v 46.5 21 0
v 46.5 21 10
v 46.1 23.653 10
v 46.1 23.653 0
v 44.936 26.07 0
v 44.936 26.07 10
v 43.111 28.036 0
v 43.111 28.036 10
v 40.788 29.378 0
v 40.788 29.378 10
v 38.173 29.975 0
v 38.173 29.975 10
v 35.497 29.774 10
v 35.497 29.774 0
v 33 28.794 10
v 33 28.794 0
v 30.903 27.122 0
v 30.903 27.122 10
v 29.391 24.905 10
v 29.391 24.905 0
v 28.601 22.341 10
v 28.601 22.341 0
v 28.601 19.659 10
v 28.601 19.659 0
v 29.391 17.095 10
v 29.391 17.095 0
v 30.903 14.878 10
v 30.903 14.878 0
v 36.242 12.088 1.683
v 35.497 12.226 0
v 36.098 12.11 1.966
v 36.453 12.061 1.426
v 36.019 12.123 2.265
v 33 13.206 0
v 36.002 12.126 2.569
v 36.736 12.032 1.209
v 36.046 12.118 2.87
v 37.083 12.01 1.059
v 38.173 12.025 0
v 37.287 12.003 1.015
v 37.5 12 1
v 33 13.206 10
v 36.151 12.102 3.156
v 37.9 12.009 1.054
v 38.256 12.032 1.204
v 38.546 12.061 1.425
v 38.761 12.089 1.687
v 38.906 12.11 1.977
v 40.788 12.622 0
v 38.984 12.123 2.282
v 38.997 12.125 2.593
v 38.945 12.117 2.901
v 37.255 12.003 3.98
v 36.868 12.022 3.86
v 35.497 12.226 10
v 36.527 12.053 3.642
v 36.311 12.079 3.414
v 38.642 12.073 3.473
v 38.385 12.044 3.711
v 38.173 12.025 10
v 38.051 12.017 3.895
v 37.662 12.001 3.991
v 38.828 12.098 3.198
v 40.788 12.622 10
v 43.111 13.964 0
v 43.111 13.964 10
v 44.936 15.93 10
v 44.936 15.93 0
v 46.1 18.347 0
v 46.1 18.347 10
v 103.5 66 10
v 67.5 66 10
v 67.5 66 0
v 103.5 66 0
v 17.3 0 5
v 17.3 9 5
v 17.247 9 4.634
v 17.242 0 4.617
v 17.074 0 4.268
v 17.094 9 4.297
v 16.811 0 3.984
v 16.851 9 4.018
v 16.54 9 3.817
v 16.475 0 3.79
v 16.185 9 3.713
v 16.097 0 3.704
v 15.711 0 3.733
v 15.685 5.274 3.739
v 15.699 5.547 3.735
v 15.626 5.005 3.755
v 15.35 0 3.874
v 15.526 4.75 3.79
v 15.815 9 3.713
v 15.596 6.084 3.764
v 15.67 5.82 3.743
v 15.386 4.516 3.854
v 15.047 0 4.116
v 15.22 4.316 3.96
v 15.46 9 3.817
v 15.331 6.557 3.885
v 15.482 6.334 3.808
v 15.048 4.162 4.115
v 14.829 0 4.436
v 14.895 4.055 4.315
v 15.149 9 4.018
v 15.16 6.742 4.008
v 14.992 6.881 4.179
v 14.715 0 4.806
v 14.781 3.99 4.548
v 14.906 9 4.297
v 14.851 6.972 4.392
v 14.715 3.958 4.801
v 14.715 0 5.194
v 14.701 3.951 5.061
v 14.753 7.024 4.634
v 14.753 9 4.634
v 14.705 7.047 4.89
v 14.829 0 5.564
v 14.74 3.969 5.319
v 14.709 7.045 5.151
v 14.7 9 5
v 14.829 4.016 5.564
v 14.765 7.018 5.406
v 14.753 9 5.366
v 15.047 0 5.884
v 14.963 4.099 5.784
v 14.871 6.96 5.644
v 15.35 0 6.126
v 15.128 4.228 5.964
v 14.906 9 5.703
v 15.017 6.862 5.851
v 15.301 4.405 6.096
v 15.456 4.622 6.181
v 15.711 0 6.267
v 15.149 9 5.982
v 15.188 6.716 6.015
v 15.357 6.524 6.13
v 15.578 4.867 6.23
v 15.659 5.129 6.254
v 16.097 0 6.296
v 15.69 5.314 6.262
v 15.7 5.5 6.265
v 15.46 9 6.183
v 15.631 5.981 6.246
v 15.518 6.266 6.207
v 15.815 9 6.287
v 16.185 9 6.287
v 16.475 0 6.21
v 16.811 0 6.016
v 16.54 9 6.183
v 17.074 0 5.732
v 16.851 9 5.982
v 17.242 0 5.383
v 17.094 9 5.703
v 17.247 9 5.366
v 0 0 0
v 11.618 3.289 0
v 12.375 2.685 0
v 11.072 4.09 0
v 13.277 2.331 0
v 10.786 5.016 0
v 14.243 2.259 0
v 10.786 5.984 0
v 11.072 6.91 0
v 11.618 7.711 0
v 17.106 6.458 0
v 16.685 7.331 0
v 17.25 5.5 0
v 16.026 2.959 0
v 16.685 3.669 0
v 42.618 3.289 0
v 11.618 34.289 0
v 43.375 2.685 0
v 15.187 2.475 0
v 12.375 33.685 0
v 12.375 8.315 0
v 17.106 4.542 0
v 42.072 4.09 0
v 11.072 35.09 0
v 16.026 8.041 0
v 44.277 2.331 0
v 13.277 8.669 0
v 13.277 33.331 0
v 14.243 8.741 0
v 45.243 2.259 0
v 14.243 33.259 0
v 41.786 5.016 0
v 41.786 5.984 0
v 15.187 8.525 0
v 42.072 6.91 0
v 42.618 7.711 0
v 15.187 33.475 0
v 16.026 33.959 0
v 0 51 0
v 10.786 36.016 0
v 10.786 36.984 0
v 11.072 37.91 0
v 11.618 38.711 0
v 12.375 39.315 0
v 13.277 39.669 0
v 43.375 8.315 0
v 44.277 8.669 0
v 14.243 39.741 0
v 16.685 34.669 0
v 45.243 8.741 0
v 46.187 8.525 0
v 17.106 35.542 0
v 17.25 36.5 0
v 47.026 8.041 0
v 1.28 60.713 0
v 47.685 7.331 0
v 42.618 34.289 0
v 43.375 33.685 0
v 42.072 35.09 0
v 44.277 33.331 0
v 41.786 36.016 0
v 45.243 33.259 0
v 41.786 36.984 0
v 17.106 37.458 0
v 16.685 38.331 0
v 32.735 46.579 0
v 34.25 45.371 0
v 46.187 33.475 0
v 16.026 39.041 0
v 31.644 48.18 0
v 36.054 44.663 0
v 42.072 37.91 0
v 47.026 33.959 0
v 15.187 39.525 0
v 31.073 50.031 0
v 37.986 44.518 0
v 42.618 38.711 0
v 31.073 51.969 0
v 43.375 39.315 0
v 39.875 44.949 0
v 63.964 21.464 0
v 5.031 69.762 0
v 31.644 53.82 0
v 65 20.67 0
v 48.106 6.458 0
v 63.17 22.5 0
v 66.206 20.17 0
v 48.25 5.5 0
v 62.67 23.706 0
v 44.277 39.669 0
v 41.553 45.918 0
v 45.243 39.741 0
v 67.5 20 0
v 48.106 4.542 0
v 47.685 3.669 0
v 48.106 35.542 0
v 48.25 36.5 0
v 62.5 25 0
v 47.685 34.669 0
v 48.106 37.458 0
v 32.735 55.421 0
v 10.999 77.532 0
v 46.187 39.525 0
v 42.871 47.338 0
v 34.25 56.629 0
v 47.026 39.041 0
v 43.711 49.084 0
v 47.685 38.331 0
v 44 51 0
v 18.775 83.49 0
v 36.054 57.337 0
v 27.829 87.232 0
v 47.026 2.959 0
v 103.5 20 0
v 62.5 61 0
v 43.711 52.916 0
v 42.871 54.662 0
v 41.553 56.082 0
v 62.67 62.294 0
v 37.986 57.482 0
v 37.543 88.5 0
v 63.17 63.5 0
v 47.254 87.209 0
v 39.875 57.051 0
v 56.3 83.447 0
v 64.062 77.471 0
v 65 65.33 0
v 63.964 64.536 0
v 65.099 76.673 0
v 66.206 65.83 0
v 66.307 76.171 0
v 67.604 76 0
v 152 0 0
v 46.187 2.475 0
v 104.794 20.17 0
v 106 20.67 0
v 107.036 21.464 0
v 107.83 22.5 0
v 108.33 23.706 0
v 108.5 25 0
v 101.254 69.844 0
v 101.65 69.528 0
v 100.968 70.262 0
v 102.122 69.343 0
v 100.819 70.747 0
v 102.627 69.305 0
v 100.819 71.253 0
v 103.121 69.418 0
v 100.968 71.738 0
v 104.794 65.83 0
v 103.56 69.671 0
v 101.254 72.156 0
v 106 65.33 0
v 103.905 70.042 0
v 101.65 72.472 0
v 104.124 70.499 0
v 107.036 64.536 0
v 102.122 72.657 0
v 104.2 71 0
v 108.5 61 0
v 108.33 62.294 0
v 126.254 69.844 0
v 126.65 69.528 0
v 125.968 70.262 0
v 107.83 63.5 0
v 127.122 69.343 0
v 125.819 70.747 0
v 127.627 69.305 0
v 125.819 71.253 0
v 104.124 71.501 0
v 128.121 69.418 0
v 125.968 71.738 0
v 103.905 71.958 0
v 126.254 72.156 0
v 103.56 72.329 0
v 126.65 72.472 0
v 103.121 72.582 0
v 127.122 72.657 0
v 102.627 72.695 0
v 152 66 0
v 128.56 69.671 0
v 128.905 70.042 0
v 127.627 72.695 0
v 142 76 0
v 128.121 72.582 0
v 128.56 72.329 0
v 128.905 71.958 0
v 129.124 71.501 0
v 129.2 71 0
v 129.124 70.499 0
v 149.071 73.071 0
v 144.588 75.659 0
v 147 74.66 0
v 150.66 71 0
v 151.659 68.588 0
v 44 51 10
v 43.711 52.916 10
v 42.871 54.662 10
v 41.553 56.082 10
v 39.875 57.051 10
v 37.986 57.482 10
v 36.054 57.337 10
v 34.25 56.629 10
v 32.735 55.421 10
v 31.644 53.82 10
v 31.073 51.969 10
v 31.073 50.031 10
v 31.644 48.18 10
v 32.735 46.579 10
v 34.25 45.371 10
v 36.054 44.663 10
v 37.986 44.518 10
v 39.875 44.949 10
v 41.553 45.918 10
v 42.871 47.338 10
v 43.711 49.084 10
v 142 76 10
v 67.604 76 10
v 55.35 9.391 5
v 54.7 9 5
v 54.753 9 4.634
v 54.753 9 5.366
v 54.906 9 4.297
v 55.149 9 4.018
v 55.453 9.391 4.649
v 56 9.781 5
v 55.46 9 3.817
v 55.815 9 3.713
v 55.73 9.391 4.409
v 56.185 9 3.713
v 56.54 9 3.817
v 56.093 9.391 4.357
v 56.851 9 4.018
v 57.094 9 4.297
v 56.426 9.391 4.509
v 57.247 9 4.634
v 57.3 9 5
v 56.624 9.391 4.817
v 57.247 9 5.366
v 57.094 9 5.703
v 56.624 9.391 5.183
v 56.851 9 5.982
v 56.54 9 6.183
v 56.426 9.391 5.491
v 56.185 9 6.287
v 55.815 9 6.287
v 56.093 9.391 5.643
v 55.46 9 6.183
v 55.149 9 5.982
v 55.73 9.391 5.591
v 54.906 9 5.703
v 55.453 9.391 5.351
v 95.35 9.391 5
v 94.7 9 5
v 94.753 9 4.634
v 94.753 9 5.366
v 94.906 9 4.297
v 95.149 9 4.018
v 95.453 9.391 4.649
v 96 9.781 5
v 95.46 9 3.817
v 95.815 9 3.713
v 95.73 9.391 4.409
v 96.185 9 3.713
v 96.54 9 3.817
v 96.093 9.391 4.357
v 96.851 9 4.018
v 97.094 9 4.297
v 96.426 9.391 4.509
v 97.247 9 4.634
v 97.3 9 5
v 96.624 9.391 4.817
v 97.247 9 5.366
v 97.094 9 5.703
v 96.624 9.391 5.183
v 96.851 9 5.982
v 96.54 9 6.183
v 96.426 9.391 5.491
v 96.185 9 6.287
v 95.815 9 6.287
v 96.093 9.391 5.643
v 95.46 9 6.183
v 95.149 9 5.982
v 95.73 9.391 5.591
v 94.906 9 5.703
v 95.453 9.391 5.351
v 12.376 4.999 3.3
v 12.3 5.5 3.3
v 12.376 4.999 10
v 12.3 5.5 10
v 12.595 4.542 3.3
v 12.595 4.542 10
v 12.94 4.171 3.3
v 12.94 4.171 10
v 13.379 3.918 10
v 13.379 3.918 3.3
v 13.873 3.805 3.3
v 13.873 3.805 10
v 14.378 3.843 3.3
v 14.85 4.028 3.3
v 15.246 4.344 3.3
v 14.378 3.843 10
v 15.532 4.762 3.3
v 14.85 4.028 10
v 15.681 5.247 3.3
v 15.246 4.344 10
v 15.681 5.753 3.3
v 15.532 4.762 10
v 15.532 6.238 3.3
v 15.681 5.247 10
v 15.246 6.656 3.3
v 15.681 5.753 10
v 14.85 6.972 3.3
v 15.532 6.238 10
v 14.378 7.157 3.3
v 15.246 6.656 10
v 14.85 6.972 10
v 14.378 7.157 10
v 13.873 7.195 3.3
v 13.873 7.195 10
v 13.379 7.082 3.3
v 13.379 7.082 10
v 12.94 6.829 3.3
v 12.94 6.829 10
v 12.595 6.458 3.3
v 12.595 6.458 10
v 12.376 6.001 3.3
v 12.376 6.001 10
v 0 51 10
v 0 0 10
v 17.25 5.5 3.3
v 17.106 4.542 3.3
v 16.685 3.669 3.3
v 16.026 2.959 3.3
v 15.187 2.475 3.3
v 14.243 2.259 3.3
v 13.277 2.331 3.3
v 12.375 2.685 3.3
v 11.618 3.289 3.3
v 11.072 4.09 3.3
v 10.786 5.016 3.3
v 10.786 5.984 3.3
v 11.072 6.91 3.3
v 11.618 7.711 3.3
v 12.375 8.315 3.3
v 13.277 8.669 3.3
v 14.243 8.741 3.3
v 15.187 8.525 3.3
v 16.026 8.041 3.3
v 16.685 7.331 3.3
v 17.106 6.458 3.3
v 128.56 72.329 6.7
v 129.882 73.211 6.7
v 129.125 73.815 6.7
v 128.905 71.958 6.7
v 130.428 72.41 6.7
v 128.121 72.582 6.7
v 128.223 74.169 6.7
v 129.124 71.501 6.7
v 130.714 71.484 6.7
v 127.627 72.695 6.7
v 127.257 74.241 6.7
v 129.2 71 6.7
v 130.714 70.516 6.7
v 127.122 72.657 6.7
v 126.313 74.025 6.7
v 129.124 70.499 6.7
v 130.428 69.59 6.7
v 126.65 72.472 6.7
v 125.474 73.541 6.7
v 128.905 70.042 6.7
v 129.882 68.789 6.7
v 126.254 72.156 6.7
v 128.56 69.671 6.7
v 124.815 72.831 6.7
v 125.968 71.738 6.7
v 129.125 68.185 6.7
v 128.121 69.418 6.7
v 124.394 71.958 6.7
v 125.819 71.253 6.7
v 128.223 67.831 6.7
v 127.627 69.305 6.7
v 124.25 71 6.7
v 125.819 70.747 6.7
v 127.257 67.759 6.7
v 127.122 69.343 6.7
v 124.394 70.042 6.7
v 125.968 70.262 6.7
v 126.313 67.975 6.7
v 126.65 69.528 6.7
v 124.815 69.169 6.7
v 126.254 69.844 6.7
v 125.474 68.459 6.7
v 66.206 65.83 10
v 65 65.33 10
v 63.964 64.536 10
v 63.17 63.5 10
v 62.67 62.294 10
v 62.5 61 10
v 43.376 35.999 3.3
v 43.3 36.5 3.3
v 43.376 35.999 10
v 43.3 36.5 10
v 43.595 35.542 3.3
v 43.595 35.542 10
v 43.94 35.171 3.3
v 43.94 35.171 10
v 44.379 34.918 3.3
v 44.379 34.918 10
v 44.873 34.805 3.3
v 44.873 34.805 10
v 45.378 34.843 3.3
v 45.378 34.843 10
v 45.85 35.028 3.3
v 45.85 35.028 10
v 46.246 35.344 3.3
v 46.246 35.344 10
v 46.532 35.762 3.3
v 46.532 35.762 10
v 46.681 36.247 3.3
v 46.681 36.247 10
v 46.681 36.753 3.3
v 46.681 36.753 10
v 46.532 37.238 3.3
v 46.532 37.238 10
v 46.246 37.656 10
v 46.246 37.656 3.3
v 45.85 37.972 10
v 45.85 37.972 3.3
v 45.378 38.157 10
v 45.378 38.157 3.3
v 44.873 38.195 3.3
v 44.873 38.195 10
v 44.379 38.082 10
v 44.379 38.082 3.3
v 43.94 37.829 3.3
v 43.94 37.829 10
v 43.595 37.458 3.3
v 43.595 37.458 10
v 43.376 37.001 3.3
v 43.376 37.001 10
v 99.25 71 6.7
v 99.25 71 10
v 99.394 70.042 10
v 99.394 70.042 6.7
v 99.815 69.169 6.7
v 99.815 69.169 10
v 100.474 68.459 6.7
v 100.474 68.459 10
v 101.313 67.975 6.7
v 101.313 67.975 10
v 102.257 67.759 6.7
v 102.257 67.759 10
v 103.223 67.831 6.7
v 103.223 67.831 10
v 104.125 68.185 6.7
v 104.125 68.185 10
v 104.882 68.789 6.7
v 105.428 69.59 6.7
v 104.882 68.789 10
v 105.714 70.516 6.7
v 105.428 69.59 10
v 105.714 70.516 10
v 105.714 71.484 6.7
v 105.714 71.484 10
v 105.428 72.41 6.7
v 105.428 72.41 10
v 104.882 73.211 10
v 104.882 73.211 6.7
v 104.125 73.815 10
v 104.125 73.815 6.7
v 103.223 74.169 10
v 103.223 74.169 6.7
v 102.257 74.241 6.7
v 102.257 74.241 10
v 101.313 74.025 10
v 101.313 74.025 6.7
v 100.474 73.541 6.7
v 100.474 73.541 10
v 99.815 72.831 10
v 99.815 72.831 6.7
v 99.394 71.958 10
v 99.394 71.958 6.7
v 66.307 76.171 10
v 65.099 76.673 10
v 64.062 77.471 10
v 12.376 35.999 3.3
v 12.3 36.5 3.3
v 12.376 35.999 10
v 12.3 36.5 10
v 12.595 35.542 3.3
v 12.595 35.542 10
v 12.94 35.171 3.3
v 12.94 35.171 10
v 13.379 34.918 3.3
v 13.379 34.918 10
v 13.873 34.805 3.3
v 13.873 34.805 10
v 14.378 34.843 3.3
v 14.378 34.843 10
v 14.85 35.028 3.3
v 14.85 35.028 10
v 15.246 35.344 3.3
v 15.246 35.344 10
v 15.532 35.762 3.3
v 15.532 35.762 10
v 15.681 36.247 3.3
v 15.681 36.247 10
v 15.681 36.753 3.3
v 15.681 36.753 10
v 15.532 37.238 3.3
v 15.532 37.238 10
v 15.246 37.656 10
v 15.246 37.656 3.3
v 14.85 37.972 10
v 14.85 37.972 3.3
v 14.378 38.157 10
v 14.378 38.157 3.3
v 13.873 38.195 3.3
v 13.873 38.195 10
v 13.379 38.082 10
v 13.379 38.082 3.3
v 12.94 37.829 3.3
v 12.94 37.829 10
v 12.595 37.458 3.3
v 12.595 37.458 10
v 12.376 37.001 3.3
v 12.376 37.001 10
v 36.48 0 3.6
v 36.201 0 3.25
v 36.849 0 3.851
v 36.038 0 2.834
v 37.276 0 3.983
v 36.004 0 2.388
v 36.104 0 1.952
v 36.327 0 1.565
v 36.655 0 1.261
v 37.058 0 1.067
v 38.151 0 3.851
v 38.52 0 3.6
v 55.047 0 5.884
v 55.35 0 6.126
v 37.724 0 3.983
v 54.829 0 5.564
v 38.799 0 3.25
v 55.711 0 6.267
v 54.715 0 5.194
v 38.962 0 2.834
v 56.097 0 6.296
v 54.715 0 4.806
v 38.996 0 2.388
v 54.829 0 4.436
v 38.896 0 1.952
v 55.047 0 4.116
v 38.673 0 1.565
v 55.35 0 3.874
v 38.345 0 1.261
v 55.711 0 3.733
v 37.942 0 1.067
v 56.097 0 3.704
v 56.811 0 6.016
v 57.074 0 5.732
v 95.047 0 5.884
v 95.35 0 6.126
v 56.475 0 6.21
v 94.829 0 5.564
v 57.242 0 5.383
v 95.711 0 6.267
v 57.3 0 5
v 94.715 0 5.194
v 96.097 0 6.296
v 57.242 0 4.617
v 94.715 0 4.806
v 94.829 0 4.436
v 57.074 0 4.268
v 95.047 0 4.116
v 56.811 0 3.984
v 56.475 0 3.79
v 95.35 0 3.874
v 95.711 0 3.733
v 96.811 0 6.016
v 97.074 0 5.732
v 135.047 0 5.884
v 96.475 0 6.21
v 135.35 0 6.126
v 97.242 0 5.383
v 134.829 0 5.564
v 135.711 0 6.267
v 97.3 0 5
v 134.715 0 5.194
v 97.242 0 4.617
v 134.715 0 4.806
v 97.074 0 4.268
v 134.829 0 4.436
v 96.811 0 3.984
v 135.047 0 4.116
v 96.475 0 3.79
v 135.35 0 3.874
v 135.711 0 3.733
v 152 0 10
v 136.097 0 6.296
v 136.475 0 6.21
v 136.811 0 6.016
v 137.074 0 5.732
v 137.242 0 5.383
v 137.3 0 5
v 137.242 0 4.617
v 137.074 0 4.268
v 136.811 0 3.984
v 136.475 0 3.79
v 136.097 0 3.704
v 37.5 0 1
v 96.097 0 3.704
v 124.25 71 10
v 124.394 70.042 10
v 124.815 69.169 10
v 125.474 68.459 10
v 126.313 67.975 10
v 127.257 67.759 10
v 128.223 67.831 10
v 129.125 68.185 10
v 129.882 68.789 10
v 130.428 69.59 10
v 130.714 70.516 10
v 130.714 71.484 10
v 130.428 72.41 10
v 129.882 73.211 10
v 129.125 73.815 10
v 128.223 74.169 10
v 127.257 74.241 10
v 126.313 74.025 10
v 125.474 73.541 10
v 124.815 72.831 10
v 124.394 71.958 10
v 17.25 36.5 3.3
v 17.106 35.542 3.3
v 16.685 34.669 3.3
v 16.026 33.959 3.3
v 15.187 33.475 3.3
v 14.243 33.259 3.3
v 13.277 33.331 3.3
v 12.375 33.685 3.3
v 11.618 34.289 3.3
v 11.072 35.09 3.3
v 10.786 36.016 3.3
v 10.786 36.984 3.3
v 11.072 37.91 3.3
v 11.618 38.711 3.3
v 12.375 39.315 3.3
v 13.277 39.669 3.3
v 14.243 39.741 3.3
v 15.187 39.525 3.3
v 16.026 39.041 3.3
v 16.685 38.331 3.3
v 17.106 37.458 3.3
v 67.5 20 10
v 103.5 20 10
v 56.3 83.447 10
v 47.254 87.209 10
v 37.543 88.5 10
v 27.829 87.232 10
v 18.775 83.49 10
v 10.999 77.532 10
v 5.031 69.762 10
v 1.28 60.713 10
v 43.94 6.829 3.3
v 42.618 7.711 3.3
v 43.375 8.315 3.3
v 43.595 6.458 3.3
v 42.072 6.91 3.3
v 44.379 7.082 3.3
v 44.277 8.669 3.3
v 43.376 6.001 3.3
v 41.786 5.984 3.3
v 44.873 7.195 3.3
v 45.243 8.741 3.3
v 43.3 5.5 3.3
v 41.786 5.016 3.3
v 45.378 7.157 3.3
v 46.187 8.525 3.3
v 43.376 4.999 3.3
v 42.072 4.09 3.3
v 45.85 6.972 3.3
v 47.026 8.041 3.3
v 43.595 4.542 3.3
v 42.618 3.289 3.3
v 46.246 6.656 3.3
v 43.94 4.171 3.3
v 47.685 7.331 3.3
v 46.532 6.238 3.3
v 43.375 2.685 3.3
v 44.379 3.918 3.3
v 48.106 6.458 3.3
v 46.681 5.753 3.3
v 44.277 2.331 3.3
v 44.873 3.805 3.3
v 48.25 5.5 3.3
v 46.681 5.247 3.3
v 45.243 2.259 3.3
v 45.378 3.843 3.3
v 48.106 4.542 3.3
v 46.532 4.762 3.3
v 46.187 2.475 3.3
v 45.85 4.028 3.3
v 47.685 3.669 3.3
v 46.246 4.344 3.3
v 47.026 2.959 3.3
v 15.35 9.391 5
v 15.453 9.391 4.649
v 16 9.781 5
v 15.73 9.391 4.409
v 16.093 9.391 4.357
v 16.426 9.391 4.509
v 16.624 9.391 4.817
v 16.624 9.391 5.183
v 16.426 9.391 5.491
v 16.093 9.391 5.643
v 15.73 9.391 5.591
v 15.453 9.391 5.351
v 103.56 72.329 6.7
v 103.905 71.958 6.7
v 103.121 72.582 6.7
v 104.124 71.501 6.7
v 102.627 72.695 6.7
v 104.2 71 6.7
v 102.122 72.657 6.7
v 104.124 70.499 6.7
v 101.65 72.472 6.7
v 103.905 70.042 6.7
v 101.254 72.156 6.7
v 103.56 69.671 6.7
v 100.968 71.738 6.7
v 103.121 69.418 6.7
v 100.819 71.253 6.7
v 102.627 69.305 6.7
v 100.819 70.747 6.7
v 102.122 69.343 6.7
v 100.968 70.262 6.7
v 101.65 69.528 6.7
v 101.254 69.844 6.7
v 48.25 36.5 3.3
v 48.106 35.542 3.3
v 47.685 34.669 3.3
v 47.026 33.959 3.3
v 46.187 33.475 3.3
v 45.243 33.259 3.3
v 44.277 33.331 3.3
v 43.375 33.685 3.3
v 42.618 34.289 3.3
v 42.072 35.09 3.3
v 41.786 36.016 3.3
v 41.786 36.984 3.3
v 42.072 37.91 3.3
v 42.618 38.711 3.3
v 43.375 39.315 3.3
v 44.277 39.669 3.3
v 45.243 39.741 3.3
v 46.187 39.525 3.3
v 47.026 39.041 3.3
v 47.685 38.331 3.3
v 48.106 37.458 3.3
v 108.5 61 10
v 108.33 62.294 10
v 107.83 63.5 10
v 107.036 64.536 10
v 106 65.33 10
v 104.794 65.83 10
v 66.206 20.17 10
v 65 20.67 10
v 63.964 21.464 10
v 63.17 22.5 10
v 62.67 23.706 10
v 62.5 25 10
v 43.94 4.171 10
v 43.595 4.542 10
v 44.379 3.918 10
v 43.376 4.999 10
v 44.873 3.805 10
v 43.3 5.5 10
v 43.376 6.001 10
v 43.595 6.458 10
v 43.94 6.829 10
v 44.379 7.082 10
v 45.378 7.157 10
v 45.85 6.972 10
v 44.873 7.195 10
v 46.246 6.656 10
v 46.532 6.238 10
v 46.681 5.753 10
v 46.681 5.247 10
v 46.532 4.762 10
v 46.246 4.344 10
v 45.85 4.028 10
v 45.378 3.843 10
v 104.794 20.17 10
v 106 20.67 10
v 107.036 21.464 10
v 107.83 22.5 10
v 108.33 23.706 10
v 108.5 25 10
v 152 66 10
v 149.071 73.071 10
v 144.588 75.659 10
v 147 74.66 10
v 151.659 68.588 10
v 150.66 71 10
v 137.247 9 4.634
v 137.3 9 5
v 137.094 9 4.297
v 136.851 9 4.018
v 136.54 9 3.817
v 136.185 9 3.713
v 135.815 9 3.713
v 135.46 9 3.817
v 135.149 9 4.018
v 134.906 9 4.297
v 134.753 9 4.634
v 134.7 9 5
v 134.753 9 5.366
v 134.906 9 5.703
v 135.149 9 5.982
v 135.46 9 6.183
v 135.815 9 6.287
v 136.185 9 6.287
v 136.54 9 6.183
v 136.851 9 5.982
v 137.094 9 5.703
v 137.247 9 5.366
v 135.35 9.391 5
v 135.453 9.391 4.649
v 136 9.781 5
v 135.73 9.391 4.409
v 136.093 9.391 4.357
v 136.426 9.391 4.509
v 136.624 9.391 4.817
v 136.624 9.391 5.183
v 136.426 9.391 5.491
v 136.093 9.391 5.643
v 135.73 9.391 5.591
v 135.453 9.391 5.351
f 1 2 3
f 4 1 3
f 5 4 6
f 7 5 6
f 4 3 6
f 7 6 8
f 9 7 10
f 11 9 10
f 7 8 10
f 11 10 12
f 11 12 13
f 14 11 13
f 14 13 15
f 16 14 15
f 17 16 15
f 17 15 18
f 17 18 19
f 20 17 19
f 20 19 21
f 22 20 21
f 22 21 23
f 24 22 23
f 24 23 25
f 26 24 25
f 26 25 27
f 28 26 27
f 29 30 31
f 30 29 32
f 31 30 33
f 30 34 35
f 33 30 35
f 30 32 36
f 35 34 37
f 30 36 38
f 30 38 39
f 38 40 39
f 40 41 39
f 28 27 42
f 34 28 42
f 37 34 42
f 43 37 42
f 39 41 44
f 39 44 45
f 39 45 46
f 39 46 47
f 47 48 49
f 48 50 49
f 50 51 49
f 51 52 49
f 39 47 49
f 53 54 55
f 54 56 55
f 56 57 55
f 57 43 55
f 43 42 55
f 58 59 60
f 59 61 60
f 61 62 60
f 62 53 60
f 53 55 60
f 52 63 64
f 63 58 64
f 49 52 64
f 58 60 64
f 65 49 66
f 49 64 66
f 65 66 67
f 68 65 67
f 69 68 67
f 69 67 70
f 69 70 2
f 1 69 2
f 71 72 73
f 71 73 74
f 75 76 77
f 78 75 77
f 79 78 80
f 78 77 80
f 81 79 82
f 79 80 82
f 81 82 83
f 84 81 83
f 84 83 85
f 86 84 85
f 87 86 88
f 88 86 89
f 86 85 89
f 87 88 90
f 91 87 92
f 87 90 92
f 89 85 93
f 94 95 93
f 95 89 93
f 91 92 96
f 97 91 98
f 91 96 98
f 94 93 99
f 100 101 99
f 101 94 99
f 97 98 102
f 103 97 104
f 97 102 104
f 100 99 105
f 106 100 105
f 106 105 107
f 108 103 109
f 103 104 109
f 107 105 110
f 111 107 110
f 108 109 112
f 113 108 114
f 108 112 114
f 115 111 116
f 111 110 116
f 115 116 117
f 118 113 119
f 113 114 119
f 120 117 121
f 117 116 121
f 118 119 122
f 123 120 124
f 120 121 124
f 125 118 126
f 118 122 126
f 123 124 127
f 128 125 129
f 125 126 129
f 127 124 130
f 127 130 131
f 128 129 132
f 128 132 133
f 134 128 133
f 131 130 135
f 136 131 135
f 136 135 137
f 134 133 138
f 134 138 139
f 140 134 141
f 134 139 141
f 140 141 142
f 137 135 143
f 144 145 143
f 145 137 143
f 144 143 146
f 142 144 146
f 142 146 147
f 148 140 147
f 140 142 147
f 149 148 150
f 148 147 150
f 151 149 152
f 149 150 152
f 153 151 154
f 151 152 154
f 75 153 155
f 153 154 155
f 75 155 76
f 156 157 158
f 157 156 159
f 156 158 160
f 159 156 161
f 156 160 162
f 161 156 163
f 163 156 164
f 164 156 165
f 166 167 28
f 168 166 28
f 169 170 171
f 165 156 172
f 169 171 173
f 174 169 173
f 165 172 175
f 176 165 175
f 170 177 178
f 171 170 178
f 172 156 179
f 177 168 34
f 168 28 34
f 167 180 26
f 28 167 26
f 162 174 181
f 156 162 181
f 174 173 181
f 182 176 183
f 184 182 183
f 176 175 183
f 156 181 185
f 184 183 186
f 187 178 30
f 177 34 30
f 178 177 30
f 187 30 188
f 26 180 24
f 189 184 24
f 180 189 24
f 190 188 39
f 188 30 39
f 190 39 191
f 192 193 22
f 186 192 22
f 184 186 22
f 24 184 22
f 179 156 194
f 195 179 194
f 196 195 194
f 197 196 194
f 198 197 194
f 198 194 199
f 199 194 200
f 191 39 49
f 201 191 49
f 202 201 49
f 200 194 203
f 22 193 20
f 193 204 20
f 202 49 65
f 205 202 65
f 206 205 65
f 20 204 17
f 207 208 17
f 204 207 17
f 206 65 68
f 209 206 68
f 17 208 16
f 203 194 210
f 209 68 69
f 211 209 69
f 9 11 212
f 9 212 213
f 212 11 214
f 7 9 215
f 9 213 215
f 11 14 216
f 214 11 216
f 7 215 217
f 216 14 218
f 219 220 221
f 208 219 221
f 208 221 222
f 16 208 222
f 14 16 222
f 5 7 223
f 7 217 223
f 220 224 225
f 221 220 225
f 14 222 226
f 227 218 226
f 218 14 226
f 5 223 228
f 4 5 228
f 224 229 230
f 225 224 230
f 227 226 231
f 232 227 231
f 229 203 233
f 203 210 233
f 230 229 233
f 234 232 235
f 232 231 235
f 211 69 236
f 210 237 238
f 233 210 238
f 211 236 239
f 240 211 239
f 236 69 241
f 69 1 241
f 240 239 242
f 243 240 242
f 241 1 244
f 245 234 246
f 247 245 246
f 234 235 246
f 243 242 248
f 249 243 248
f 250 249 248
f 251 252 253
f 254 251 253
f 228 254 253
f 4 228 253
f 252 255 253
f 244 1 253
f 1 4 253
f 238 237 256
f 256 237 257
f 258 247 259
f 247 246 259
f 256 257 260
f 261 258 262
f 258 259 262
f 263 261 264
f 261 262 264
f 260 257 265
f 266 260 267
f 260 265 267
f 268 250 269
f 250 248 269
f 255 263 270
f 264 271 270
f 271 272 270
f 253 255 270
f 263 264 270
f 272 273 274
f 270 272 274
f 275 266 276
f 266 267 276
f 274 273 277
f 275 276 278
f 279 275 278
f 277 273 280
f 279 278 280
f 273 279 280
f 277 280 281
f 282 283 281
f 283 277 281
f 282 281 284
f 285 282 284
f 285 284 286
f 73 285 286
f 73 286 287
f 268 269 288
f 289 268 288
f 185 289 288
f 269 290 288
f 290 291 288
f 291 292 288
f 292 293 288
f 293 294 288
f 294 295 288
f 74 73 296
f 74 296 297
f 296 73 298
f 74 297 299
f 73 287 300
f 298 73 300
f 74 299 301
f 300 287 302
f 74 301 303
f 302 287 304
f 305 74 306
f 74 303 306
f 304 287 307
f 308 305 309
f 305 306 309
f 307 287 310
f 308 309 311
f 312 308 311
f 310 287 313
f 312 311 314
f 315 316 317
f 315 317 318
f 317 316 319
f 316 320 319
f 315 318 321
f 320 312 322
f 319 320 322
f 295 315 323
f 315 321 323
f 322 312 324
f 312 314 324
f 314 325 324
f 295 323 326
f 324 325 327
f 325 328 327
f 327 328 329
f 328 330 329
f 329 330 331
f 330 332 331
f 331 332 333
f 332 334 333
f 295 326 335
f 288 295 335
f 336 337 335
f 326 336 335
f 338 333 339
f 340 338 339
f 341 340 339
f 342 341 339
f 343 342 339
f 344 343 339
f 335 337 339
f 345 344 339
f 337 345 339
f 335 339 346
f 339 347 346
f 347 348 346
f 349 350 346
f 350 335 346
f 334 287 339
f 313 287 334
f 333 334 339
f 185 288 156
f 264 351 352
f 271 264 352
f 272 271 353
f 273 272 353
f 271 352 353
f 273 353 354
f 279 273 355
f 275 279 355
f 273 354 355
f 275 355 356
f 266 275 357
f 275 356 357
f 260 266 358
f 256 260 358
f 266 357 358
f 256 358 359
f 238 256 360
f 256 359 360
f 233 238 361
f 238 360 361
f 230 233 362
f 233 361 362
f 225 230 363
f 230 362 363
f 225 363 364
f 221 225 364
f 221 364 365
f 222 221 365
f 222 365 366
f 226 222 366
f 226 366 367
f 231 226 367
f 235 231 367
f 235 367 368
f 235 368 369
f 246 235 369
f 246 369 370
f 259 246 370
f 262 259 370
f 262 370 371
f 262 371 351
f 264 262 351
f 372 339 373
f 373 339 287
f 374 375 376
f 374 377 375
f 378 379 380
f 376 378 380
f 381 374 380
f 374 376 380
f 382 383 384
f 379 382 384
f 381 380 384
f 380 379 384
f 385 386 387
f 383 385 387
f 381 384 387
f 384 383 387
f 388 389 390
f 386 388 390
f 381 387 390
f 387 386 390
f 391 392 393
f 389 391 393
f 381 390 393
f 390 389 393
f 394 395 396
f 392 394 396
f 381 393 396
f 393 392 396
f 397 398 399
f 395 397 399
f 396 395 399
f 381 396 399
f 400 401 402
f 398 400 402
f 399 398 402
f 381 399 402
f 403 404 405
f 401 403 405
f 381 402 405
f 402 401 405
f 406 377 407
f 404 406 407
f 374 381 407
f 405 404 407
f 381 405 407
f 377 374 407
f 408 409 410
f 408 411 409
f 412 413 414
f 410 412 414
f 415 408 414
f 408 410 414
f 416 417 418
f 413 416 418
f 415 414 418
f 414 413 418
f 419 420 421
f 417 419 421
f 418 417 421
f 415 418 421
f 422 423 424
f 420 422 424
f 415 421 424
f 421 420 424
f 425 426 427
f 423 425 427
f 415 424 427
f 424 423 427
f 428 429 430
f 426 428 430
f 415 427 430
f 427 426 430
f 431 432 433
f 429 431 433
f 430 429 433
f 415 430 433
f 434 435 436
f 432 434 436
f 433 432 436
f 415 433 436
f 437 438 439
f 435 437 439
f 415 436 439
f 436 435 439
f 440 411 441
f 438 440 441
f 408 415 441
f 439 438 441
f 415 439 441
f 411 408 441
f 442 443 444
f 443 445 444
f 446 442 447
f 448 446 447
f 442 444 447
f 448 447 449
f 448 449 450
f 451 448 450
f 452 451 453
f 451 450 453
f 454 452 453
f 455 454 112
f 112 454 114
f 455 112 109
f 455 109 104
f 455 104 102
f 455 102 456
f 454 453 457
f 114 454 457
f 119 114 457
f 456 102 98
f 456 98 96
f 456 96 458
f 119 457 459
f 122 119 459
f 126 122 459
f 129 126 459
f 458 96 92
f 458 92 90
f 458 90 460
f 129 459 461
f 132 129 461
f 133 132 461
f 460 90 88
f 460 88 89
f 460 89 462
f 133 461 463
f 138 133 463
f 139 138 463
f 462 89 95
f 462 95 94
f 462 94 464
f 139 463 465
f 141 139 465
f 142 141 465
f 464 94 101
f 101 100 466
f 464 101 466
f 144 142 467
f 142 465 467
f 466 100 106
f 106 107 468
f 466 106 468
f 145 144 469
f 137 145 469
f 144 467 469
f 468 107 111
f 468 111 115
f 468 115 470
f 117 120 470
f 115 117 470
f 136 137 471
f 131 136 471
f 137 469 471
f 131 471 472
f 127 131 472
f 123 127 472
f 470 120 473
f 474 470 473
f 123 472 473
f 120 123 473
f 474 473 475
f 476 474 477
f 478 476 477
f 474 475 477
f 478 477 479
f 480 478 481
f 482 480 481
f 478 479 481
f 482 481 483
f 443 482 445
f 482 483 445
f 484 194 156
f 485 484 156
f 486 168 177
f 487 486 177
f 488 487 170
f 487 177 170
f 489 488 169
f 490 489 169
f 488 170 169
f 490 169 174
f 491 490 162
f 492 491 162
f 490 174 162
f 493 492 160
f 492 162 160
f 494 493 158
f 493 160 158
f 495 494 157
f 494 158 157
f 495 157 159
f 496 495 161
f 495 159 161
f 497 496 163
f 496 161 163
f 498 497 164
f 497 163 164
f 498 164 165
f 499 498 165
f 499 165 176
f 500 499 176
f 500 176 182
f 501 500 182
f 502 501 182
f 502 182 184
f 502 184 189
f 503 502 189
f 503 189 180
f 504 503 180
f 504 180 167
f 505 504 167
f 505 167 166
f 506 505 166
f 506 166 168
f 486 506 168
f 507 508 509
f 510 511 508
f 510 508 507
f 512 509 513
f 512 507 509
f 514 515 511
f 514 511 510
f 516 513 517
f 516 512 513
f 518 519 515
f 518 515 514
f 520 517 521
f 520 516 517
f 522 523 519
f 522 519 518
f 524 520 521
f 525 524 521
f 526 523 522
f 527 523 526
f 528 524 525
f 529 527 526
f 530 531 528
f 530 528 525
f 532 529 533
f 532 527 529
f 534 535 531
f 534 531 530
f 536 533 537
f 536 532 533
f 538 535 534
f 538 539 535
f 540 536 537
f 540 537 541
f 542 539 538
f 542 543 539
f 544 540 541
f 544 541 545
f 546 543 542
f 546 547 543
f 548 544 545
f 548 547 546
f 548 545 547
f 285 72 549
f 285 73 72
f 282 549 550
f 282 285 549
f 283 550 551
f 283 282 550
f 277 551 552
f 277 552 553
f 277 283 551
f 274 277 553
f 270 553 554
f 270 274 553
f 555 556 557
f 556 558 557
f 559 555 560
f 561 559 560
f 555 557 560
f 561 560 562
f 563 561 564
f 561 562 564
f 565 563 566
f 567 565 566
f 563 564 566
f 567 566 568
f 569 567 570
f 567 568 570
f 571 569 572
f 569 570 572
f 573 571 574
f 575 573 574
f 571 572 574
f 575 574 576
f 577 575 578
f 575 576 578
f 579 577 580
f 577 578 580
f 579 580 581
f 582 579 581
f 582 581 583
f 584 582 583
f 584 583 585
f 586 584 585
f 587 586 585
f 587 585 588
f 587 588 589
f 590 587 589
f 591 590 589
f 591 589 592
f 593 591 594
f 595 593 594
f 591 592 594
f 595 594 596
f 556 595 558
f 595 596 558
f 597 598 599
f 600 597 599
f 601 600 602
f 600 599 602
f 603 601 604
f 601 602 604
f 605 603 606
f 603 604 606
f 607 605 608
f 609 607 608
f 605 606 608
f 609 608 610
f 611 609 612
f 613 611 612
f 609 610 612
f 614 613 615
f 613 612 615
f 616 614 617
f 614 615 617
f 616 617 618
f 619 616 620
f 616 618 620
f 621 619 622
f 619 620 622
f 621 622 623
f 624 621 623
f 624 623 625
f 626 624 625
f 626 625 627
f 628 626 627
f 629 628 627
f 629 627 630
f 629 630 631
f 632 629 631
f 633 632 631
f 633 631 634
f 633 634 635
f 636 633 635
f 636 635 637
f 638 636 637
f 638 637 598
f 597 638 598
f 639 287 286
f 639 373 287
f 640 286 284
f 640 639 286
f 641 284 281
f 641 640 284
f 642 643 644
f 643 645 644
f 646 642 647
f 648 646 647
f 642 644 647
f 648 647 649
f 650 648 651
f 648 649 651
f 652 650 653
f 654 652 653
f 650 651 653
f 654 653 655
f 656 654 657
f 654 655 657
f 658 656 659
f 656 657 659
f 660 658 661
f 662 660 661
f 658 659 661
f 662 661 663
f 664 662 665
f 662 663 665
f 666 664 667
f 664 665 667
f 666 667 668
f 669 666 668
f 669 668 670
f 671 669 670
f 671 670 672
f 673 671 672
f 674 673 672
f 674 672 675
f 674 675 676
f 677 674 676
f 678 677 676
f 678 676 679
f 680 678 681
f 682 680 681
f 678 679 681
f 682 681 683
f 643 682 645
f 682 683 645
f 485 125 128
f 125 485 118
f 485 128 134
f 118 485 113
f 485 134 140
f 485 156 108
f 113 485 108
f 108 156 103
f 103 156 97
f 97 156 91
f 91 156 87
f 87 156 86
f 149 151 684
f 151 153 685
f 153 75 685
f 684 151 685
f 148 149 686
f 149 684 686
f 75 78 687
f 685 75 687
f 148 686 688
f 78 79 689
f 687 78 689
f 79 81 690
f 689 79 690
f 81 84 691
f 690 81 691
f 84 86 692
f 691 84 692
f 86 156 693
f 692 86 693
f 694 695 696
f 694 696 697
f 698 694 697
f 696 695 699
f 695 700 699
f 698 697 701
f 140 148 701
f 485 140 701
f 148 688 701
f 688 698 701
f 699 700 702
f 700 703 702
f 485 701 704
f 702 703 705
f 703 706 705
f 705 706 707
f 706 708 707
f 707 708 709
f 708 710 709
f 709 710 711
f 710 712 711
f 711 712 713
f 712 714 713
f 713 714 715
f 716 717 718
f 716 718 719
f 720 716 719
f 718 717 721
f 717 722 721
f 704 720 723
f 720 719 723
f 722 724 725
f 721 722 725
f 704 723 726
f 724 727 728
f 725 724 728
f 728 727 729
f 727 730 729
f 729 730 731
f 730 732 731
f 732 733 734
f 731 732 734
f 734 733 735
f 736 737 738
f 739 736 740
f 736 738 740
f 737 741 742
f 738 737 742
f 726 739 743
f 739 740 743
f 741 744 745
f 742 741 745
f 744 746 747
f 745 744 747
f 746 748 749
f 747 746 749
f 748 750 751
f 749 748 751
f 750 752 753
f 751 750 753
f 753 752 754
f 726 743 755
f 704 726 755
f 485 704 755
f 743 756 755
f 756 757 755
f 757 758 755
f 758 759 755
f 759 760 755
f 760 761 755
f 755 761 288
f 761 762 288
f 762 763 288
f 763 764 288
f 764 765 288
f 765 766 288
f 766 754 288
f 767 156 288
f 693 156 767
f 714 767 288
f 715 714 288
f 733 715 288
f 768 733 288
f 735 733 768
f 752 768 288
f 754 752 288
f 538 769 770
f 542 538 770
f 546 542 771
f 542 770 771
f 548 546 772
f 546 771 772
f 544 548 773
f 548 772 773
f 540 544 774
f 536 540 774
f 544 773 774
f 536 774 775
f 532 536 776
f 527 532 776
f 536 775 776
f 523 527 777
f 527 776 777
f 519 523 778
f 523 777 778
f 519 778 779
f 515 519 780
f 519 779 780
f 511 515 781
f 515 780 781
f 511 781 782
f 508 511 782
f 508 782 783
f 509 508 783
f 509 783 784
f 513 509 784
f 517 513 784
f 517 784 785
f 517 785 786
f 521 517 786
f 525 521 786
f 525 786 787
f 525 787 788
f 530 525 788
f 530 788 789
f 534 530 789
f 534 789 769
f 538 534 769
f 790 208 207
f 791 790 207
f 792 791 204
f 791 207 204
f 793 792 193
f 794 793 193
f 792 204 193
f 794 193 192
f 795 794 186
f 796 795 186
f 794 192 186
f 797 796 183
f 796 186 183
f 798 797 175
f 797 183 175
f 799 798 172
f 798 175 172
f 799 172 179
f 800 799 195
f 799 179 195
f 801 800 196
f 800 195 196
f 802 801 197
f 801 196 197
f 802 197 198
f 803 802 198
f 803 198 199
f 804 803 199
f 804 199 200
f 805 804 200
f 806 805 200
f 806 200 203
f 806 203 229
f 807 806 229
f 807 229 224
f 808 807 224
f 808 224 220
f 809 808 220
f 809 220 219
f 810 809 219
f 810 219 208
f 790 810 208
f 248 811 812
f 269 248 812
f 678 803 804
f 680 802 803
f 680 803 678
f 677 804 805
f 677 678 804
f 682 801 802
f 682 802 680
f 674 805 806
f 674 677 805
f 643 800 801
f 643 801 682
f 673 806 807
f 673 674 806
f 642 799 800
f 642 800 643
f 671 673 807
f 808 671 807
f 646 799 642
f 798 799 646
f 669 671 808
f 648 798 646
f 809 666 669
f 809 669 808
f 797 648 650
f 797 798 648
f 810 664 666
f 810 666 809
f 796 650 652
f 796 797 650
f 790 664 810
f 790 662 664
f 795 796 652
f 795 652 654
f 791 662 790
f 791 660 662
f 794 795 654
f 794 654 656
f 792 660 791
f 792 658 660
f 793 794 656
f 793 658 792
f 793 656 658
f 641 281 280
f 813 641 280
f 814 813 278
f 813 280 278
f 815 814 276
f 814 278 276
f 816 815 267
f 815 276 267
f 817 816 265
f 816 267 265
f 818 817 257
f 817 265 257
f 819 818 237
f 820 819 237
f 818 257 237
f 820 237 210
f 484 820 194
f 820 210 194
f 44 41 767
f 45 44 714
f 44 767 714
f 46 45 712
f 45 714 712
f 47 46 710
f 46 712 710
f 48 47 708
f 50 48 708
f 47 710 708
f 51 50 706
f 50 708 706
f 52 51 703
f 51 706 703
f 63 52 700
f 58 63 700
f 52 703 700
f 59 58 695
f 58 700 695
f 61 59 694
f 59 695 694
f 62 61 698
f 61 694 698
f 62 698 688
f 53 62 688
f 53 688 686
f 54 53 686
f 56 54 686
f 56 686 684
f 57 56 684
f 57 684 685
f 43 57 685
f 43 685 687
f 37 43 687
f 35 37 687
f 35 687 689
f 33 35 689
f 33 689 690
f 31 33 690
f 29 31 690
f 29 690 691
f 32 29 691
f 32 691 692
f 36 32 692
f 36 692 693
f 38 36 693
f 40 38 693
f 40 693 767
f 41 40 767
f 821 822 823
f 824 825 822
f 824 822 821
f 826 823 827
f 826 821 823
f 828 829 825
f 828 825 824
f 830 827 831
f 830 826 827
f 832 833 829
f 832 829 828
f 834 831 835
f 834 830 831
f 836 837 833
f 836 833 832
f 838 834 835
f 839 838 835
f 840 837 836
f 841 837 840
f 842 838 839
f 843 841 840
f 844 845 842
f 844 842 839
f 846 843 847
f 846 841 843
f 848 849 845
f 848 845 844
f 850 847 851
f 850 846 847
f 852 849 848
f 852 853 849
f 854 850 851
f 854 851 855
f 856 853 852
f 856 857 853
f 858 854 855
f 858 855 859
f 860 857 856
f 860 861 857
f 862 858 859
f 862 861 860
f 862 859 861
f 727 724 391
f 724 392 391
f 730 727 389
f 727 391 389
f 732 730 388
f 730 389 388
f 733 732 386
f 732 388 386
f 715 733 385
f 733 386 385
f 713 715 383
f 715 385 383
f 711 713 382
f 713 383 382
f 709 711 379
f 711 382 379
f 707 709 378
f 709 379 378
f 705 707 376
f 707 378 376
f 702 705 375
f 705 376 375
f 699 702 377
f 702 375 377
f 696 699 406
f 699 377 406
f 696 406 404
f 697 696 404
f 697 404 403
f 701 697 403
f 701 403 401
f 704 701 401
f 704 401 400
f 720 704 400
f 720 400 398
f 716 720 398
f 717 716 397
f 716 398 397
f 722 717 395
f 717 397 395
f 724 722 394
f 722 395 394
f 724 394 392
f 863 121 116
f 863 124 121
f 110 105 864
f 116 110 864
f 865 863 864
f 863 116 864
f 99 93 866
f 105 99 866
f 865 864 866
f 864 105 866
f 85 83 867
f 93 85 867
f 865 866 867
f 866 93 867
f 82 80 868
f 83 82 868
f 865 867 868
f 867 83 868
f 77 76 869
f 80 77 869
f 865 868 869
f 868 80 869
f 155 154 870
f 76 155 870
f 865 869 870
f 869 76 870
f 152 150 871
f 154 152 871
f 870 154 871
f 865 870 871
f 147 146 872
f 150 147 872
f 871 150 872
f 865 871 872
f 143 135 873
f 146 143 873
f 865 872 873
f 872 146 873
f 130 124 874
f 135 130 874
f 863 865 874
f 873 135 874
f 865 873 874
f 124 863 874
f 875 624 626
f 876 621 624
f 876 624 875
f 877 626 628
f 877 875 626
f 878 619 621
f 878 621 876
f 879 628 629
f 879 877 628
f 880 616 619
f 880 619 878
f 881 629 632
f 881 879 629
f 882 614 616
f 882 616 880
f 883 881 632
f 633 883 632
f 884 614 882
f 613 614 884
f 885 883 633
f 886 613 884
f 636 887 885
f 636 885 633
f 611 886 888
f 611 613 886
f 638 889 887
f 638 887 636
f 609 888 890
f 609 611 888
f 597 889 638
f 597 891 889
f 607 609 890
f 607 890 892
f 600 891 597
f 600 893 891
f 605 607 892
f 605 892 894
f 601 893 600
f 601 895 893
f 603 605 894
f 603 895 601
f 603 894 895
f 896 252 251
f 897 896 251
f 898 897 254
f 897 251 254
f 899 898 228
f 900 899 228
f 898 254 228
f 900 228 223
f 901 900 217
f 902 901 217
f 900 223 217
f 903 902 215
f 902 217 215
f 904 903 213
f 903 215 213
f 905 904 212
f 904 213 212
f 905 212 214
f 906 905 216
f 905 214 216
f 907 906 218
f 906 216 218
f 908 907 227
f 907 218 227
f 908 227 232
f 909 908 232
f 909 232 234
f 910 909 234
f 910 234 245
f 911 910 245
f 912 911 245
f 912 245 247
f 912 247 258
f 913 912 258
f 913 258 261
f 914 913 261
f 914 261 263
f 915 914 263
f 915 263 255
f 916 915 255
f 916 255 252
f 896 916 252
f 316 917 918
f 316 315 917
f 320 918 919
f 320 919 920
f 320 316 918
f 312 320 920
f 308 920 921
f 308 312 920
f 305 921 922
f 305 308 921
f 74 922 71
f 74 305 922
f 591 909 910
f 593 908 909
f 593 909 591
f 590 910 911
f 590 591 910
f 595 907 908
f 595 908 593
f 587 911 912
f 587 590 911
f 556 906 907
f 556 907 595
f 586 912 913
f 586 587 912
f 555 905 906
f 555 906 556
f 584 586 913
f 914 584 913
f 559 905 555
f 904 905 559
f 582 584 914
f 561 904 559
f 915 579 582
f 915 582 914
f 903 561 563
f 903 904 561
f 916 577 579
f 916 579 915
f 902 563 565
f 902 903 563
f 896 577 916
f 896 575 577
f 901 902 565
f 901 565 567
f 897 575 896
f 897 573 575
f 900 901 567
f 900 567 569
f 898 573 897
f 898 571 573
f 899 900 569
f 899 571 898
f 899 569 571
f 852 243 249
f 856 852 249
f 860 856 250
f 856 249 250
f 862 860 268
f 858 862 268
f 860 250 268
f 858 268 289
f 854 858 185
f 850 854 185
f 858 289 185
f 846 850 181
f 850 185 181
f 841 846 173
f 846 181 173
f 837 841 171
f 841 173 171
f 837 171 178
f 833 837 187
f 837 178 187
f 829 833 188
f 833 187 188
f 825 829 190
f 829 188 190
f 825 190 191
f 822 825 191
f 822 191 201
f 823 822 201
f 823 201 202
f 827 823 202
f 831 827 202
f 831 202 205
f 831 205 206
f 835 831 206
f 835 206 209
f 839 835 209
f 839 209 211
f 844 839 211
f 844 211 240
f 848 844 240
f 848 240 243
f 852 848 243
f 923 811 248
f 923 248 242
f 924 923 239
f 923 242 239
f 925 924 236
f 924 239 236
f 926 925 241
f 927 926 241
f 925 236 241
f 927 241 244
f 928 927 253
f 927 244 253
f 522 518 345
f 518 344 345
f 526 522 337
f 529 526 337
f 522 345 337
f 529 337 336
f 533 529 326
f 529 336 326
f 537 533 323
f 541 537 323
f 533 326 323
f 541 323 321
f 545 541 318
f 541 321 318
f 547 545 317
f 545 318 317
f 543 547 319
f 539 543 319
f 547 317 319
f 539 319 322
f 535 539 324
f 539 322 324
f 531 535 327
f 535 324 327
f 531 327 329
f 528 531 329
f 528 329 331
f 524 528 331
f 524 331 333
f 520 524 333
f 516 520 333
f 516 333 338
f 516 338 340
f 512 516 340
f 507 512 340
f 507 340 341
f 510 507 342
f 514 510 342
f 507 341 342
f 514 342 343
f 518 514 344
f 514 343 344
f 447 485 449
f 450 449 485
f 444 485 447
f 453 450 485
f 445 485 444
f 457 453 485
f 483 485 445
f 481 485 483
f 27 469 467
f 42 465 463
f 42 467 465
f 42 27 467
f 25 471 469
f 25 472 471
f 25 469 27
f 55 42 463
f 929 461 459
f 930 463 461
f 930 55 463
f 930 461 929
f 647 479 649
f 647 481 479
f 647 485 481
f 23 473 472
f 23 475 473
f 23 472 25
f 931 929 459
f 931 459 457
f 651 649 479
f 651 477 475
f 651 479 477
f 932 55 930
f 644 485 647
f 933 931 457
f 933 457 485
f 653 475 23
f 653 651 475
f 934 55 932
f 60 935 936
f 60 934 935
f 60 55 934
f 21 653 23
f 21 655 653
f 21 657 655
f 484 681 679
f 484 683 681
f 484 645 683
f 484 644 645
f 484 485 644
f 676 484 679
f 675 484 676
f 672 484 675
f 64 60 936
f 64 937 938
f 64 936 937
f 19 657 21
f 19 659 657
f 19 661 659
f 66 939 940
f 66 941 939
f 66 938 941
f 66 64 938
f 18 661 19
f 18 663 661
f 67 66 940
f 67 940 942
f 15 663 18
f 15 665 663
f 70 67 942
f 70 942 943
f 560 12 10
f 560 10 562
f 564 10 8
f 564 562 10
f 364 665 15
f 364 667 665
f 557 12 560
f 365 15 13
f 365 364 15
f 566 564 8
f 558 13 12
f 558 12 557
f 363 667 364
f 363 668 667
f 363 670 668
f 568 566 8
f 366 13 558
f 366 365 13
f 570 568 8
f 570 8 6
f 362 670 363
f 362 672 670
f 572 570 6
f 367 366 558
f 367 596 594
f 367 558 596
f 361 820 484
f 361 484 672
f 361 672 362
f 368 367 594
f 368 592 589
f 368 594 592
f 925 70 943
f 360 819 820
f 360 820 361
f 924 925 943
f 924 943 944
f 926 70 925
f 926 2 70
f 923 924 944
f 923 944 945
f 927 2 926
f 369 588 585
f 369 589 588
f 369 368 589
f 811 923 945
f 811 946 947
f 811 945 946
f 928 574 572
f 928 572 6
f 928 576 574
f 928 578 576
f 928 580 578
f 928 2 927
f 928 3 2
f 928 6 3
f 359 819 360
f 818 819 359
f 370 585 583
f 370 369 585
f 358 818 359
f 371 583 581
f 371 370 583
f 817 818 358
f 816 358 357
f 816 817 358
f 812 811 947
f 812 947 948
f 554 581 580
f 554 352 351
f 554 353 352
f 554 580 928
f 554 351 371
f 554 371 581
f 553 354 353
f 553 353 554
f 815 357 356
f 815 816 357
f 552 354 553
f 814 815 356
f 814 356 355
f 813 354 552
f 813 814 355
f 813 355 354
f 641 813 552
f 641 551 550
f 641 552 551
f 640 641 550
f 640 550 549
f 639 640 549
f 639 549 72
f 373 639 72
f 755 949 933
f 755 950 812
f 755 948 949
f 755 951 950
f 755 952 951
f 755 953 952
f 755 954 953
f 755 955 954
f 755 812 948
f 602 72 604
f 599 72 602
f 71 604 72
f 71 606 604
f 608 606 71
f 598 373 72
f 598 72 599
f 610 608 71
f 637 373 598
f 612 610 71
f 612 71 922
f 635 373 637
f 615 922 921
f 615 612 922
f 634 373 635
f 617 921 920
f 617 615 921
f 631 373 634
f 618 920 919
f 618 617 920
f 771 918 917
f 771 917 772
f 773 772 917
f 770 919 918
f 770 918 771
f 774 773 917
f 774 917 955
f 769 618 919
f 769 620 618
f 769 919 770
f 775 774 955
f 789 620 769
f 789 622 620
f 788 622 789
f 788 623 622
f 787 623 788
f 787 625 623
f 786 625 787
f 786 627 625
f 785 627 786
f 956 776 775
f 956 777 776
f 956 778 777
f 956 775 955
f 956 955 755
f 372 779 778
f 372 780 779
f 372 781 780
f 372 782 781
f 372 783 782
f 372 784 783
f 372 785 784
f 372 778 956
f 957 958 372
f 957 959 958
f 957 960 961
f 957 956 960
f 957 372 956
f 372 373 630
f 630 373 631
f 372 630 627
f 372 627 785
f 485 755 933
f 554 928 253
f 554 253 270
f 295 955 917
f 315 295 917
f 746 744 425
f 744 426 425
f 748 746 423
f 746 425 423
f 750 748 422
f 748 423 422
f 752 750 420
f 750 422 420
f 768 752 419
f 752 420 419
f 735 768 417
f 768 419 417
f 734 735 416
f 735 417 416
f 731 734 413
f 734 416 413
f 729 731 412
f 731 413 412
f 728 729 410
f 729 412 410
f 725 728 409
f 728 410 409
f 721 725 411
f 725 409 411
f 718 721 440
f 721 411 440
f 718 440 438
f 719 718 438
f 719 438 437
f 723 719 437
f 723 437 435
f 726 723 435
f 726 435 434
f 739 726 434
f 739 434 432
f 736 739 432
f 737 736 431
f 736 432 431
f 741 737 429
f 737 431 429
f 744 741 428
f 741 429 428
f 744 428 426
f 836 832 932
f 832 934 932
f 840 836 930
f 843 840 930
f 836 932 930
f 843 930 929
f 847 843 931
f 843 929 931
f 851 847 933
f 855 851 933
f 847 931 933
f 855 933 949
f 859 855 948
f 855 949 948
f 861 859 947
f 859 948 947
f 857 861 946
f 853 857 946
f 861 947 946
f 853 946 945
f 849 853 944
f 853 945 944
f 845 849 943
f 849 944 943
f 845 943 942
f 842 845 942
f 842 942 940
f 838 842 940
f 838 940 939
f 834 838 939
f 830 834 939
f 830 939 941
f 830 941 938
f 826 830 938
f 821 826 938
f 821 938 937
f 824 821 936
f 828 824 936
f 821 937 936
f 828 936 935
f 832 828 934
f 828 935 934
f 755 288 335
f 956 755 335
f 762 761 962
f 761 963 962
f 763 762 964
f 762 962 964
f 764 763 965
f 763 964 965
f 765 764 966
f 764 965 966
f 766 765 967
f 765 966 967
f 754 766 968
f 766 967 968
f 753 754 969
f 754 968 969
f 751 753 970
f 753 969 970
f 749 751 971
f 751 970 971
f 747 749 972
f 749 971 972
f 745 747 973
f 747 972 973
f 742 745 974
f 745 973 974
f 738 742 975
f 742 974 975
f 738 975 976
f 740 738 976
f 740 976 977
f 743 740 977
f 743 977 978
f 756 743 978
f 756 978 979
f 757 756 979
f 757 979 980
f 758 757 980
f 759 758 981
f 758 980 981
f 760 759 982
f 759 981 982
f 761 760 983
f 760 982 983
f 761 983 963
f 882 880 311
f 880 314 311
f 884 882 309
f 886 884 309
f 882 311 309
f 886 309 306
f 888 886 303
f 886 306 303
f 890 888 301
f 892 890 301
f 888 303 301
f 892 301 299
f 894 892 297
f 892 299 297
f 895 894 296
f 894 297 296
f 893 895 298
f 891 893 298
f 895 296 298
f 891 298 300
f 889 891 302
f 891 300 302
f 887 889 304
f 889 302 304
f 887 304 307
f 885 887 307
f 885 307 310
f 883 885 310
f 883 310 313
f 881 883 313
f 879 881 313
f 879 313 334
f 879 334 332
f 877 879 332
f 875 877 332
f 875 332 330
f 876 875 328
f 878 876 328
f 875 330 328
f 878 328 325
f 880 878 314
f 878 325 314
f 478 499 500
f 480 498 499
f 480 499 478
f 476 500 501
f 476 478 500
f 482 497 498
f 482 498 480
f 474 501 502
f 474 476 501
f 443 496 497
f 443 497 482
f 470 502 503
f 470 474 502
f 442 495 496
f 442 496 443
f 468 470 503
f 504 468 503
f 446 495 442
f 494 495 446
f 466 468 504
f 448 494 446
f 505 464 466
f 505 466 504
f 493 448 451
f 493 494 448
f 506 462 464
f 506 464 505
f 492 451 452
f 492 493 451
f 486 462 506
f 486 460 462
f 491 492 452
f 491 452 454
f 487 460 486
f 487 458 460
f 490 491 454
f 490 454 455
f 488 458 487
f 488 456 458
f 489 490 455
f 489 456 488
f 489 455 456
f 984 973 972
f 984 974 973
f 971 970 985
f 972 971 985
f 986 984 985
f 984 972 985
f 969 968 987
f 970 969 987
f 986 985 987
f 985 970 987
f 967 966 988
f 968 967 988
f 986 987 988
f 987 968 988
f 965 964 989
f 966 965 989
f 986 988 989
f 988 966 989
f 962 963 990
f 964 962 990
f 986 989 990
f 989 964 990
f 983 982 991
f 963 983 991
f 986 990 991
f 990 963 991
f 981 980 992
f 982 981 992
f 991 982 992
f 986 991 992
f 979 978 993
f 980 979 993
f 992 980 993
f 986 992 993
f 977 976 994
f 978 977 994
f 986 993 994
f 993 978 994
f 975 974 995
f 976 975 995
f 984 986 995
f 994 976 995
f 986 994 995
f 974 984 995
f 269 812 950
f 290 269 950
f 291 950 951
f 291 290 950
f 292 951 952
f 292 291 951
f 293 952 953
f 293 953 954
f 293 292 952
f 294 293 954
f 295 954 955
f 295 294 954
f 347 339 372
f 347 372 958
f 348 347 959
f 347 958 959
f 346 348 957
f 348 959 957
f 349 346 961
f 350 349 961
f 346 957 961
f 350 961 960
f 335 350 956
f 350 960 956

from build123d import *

# Parameters (mm, degrees)
BOSS_EXTRUDE1_DEPTH                      = 10
FILLET1_R                                = 5
FILLET2_R                                = 10
SKETCH2_R                                = 9
CUT_EXTRUDE1_DEPTH                       = 177.171081622
SKETCH3_R                                = 6.5
CUT_EXTRUDE2_DEPTH                       = 177.171081622
SKETCH4_W                                = 46
SKETCH4_H                                = 46
CUT_EXTRUDE3_DEPTH                       = 177.171081622
CUT_EXTRUDE4_REACH                       = 178.171
CUT_EXTRUDE4_END_RADIUS                  = 9
SKETCH5_R                                = 1.5
FILLET3_R                                = 5
M3X0_5_TAPPED_HOLE1_D                    = 2.6
M3X0_5_TAPPED_HOLE1_DEPTH                = 9
M3X0_5_TAPPED_HOLE1_TIP                  = 0.781118805
CBORE_FOR_M3_PAN_HEAD_SCREW1_D           = 3.4
CBORE_FOR_M3_PAN_HEAD_SCREW1_CBORE_D     = 6.5
CBORE_FOR_M3_PAN_HEAD_SCREW1_CBORE_DEPTH = 3.3
CBORE_FOR_M3_PAN_HEAD_SCREW2_D           = 3.4
CBORE_FOR_M3_PAN_HEAD_SCREW2_CBORE_D     = 6.5
CBORE_FOR_M3_PAN_HEAD_SCREW2_CBORE_DEPTH = 3.3


with BuildPart() as part:
    # Sketch1 → Boss-Extrude1 (new body)
    with BuildSketch(Plane.XY):
        with BuildLine():
            Line((0, 0), (152, 0))
            Line((152, 0), (152, 76))
            Line((152, 76), (65.450849719, 76))
            ThreePointArc((65.450849719, 76), (24.119171634, 86.031463461), (0, 51))
            Line((0, 51), (0, 0))
        make_face()
    extrude(amount=BOSS_EXTRUDE1_DEPTH)

    # Fillet1
    fillet1_edges = [part.edges().sort_by_distance(p)[0] for p in [
        (65.450849719, 76, 5),
    ]]
    fillet(fillet1_edges, radius=FILLET1_R)

    # Fillet2
    fillet2_edges = [part.edges().sort_by_distance(p)[0] for p in [
        (152, 76, 5),
    ]]
    fillet(fillet2_edges, radius=FILLET2_R)

    # Sketch2 → Cut-Extrude1 (cut, through all)
    with BuildSketch(Plane.XY.offset(10)):
        with Locations((37.5, 21)):
            Circle(SKETCH2_R)
    extrude(amount=-CUT_EXTRUDE1_DEPTH, mode=Mode.SUBTRACT)

    # Sketch3 → Cut-Extrude2 (cut, through all)
    with BuildSketch(Plane.XY.offset(10)):
        with Locations((37.5, 51)):
            Circle(SKETCH3_R)
    extrude(amount=-CUT_EXTRUDE2_DEPTH, mode=Mode.SUBTRACT)

    # Sketch4 → Cut-Extrude3 (cut, through all)
    with BuildSketch(Plane.XY.offset(10)):
        with Locations((85.5, 43)):
            Rectangle(SKETCH4_W, SKETCH4_H)
    extrude(amount=-CUT_EXTRUDE3_DEPTH, mode=Mode.SUBTRACT)

    # Cut-Extrude4: up to this cylinder (the profile starts outside it)
    cut_extrude4_end = Plane(origin=(37.5, 21, 2.5), z_dir=(0, 0, 1)) * Cylinder(CUT_EXTRUDE4_END_RADIUS, 375.342, mode=Mode.PRIVATE)
    # Sketch5 → Cut-Extrude4 (cut, up to the surface)
    with BuildSketch(Plane.XZ, mode=Mode.PRIVATE) as cut_extrude4_sk1:
        with Locations(Location((37.5, 2.5, 0), (0, 0, 270))):
            Circle(SKETCH5_R)
    cut_extrude4_tool1 = extrude(cut_extrude4_sk1.sketch, amount=-CUT_EXTRUDE4_REACH, mode=Mode.PRIVATE) - cut_extrude4_end
    add(cut_extrude4_tool1.solids().sort_by_distance((37.5, 0, 2.5))[0], mode=Mode.SUBTRACT)

    # Fillet3
    fillet3_edges = [part.edges().sort_by_distance(p)[0] for p in [
        (62.5, 20, 5),
        (62.5, 66, 5),
        (108.5, 66, 5),
        (108.5, 20, 5),
    ]]
    fillet(fillet3_edges, radius=FILLET3_R)

    # M3x0.5 Tapped Hole1
    with Locations(Plane(origin=(0, 0, 0), x_dir=(-1, 0, 0), z_dir=(0, -1, 0))):
        with Locations((-16, -5), (-56, -5), (-96, -5), (-136, -5)):
            Hole(M3X0_5_TAPPED_HOLE1_D / 2, depth=M3X0_5_TAPPED_HOLE1_DEPTH)
            with Locations((0, 0, -(M3X0_5_TAPPED_HOLE1_DEPTH + M3X0_5_TAPPED_HOLE1_TIP / 2))):  # 118° drill point
                Cone(0, M3X0_5_TAPPED_HOLE1_D / 2, M3X0_5_TAPPED_HOLE1_TIP, mode=Mode.SUBTRACT)

    # CBORE for M3 Pan Head Screw1 (through all)
    with Locations(Plane(origin=(0, 0, 0), x_dir=(1, 0, 0), z_dir=(0, 0, -1))):
        with Locations((14, -36.5), (45, -36.5), (45, -5.5), (14, -5.5)):
            CounterBoreHole(CBORE_FOR_M3_PAN_HEAD_SCREW1_D / 2, CBORE_FOR_M3_PAN_HEAD_SCREW1_CBORE_D / 2, CBORE_FOR_M3_PAN_HEAD_SCREW1_CBORE_DEPTH)

    # CBORE for M3 Pan Head Screw2 (through all)
    with Locations(Plane(origin=(0, 0, 10), x_dir=(-1, 0, 0), z_dir=(0, 0, 1))):
        with Locations((-127.5, -71), (-102.5, -71)):
            CounterBoreHole(CBORE_FOR_M3_PAN_HEAD_SCREW2_D / 2, CBORE_FOR_M3_PAN_HEAD_SCREW2_CBORE_D / 2, CBORE_FOR_M3_PAN_HEAD_SCREW2_CBORE_DEPTH)


solid = part.part
